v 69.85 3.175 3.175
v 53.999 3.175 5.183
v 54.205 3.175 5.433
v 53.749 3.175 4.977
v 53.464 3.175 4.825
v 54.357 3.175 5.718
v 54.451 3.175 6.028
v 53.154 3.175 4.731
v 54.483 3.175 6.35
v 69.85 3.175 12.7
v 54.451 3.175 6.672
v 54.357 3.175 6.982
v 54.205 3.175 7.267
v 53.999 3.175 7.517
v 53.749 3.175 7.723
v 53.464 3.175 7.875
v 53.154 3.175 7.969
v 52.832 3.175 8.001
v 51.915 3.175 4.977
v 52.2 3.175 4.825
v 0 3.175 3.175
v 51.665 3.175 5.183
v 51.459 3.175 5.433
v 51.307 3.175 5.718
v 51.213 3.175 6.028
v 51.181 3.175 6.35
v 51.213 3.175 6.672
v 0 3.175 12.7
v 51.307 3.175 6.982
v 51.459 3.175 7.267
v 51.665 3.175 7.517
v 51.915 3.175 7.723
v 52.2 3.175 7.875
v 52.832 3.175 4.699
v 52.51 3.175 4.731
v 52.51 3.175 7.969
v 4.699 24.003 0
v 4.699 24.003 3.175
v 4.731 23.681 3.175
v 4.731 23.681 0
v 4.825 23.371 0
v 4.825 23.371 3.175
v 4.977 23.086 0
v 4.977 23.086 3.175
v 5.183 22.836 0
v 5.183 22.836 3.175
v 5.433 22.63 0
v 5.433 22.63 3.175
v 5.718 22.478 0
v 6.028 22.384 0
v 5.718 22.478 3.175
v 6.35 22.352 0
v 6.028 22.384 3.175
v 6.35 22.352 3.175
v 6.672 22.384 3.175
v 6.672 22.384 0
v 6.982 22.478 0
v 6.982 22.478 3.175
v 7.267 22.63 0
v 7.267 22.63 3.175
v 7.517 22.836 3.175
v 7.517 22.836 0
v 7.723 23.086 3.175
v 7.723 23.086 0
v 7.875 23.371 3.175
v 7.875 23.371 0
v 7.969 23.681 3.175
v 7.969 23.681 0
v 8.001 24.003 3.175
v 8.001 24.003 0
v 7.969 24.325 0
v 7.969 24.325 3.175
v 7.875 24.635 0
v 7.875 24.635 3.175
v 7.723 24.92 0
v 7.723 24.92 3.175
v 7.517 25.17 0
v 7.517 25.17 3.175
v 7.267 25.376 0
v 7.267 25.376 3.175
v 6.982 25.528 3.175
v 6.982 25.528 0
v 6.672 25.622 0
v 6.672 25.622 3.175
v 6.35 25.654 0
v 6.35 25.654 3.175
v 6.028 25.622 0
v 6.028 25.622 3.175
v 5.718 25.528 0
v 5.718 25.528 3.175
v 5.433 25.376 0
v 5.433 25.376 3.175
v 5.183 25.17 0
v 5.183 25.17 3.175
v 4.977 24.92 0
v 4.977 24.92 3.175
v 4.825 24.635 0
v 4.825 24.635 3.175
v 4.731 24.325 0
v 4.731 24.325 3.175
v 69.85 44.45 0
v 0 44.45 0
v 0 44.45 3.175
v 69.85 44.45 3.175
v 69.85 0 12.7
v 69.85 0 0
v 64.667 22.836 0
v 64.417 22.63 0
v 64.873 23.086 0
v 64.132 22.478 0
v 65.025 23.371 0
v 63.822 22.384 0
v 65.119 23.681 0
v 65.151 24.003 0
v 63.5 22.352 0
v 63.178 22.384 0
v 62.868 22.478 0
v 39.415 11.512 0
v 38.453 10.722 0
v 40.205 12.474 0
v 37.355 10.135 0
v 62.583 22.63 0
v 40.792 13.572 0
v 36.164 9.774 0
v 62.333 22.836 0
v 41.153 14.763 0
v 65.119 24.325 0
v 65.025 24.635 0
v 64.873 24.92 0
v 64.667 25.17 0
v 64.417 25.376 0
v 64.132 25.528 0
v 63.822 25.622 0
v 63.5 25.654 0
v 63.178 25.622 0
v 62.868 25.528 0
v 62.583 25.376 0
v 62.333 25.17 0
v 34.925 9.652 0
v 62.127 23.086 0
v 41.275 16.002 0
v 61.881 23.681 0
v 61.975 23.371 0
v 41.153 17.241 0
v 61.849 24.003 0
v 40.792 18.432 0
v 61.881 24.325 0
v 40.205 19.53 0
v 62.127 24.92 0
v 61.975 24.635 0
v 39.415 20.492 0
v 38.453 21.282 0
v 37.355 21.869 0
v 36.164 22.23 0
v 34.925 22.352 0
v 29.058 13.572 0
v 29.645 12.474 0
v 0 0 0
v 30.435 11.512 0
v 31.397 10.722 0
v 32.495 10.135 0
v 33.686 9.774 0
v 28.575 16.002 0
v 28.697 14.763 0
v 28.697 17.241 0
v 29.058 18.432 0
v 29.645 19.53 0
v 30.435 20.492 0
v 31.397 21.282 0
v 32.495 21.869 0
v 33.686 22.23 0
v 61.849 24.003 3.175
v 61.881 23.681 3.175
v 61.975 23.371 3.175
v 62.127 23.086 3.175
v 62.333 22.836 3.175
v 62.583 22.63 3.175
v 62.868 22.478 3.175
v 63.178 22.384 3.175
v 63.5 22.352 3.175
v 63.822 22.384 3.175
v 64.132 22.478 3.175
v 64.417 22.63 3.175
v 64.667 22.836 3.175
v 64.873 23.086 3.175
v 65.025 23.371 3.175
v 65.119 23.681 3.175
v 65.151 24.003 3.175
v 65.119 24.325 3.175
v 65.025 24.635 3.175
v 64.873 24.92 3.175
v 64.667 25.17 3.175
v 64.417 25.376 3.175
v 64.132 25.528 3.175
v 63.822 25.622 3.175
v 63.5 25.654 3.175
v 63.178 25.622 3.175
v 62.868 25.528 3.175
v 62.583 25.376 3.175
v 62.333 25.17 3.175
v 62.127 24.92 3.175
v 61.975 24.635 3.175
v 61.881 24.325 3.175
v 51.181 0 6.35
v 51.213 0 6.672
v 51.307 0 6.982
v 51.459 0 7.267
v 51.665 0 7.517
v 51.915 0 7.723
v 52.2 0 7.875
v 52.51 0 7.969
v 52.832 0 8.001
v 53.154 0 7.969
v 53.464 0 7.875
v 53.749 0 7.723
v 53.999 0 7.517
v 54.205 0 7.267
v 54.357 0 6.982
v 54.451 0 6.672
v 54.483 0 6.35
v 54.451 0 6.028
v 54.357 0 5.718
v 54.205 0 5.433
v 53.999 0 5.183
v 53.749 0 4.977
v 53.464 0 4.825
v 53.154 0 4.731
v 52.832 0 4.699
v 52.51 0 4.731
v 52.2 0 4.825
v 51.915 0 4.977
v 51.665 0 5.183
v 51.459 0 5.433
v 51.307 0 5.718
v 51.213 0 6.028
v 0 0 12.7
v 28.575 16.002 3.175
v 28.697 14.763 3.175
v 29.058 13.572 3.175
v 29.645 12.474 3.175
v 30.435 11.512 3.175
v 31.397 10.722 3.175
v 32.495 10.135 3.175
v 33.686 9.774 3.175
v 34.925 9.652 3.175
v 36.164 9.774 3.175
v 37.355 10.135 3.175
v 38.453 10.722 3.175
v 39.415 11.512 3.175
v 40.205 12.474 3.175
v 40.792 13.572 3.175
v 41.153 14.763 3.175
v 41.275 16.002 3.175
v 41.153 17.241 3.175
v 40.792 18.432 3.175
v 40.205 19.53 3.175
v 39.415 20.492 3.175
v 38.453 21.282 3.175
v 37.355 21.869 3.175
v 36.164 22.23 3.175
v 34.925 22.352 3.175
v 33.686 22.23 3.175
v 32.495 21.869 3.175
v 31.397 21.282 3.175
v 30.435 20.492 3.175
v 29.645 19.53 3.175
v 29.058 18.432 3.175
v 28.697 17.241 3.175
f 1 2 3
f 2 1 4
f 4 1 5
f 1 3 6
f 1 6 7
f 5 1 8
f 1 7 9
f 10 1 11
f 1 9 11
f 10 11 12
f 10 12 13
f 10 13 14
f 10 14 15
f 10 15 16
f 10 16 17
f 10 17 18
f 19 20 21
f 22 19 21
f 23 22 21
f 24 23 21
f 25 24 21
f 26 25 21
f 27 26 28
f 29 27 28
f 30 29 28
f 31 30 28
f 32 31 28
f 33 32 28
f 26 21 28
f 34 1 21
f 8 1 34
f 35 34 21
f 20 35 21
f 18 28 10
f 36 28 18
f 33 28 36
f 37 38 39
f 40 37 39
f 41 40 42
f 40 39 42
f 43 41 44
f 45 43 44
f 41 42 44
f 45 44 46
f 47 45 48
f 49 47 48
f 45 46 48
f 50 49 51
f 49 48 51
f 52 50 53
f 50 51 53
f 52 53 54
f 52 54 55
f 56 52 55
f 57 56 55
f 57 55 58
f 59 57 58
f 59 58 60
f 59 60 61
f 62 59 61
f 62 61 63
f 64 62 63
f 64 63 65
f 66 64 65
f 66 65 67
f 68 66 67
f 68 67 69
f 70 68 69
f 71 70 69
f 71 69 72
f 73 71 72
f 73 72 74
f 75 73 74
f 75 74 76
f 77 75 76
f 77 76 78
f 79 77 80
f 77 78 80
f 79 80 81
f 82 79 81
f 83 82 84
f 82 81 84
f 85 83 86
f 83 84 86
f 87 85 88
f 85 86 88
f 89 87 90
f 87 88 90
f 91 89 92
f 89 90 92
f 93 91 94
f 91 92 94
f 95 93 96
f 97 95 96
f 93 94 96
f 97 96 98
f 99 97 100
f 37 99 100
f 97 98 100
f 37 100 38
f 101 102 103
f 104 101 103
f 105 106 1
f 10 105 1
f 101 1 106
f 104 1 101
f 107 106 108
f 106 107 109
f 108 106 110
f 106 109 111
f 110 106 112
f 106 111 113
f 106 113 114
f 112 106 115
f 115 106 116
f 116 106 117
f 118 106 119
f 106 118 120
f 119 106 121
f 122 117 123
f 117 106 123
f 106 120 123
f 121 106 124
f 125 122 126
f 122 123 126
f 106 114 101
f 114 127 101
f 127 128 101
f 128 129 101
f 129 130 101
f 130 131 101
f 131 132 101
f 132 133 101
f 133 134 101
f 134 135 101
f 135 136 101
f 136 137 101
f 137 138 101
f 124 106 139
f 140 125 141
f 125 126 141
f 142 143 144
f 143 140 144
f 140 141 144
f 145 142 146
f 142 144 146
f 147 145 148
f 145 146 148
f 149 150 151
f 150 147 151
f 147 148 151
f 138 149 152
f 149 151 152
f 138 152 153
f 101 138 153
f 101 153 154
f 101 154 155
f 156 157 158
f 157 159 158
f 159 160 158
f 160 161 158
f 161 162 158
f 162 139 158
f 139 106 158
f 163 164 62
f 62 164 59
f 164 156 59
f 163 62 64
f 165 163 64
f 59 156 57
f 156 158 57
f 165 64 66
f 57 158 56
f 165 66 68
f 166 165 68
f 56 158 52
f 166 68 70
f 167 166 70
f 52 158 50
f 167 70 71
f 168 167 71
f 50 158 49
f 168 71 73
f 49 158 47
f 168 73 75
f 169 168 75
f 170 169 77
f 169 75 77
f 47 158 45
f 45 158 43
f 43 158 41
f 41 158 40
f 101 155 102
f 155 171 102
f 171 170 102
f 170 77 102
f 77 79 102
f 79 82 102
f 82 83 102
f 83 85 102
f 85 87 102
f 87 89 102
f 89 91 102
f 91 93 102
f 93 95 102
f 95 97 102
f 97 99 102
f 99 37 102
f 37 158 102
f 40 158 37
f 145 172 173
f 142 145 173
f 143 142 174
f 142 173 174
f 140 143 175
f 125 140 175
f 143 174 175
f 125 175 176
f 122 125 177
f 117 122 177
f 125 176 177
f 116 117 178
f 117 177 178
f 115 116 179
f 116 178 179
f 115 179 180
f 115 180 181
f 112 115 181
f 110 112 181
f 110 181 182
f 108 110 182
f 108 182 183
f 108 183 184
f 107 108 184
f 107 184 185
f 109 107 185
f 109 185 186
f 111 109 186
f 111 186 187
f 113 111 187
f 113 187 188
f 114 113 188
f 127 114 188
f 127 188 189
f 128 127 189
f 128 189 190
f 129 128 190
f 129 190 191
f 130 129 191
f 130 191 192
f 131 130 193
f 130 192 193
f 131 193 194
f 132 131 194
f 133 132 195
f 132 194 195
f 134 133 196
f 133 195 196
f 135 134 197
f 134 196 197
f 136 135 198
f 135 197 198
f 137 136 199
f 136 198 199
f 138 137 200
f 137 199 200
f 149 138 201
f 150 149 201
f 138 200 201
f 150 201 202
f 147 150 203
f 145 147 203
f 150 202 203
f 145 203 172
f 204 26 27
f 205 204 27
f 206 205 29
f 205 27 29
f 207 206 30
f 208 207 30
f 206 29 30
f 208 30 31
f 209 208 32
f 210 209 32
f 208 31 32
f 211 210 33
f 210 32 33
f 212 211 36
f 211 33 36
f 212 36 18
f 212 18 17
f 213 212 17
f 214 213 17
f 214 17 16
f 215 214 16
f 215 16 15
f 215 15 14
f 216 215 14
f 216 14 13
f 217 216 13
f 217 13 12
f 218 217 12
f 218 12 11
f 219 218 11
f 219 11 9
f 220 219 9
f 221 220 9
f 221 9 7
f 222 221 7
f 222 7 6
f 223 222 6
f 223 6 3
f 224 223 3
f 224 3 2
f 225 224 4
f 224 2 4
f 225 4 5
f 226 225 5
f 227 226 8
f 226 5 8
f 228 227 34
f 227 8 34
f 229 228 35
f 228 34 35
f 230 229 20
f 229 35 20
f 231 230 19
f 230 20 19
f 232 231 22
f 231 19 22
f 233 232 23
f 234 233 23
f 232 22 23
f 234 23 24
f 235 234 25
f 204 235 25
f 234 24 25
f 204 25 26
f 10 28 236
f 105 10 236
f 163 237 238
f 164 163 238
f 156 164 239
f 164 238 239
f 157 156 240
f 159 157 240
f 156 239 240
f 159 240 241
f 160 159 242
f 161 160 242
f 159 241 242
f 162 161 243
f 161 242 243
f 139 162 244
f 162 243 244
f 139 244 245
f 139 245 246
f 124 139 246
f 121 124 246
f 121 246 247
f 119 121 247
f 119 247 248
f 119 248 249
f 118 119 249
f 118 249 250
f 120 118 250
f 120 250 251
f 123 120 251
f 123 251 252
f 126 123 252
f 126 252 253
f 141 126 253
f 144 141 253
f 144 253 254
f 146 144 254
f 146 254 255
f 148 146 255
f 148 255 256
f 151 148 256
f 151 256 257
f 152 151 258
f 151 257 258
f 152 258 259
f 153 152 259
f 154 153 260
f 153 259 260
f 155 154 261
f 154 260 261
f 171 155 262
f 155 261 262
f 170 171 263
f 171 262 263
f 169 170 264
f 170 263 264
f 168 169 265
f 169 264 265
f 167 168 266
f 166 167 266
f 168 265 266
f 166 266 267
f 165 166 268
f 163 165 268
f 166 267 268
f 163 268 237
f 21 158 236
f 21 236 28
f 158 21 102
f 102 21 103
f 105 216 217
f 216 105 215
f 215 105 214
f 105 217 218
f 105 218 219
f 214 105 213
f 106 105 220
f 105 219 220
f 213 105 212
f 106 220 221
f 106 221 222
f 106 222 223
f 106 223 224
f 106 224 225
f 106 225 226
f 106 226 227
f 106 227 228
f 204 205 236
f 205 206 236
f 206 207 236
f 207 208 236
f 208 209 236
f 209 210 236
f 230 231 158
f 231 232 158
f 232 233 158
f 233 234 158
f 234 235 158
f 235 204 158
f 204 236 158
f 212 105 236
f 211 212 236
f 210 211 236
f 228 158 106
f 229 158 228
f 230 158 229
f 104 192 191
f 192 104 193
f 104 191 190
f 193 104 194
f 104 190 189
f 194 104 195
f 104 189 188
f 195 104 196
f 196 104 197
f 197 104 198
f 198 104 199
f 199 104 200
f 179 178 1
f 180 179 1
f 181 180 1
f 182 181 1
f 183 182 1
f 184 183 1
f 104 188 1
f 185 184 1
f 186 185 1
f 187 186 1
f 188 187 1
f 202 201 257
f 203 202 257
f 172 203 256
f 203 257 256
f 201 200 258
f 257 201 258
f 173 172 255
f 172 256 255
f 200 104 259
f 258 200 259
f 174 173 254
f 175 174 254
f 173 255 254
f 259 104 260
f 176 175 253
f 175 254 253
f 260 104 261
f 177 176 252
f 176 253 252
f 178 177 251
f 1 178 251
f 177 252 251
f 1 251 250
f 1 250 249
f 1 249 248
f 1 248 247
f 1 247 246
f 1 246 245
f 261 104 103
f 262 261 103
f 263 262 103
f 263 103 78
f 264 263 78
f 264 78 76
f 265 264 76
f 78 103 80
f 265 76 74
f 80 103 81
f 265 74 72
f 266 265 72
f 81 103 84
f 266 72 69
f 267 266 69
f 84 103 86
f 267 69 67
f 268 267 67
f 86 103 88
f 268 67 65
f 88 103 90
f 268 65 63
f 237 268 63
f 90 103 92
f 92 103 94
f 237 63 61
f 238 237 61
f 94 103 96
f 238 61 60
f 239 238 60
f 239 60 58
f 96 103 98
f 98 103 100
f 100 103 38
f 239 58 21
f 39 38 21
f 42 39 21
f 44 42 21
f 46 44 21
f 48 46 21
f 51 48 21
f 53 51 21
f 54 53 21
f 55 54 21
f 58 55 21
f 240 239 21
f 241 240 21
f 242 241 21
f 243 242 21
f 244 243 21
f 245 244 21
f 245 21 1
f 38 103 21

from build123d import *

# Parameters (mm, degrees)
F1_DEPTH = 69.85
F3_D     = 3.302
F5_D     = 3.302
F6_D     = 12.7


with BuildPart() as f1:
    # F0 (on Right) → F1 (new body)
    with BuildSketch(Plane.YZ):
        Polygon((0, 12.7), (0, 0), (44.45, 0), (44.45, 3.175), (3.175, 3.175), (3.175, 12.7), align=None)
    extrude(amount=F1_DEPTH)

    # F3 (through all)
    with Locations(Plane(origin=(0, 0, 0), x_dir=(1, 0, 0), z_dir=(0, 0, -1))):
        with Locations((6.35, -24.003), (63.5, -24.003)):
            Hole(F3_D / 2)

    # F5 (through all)
    with Locations(Plane.XZ):
        with Locations((52.832, 6.35)):
            Hole(F5_D / 2)

    # F6 (through all)
    with Locations(Plane(origin=(0, 0, 0), x_dir=(1, 0, 0), z_dir=(0, 0, -1))):
        with Locations((34.925, -16.002)):
            Hole(F6_D / 2)


solid = f1.part
